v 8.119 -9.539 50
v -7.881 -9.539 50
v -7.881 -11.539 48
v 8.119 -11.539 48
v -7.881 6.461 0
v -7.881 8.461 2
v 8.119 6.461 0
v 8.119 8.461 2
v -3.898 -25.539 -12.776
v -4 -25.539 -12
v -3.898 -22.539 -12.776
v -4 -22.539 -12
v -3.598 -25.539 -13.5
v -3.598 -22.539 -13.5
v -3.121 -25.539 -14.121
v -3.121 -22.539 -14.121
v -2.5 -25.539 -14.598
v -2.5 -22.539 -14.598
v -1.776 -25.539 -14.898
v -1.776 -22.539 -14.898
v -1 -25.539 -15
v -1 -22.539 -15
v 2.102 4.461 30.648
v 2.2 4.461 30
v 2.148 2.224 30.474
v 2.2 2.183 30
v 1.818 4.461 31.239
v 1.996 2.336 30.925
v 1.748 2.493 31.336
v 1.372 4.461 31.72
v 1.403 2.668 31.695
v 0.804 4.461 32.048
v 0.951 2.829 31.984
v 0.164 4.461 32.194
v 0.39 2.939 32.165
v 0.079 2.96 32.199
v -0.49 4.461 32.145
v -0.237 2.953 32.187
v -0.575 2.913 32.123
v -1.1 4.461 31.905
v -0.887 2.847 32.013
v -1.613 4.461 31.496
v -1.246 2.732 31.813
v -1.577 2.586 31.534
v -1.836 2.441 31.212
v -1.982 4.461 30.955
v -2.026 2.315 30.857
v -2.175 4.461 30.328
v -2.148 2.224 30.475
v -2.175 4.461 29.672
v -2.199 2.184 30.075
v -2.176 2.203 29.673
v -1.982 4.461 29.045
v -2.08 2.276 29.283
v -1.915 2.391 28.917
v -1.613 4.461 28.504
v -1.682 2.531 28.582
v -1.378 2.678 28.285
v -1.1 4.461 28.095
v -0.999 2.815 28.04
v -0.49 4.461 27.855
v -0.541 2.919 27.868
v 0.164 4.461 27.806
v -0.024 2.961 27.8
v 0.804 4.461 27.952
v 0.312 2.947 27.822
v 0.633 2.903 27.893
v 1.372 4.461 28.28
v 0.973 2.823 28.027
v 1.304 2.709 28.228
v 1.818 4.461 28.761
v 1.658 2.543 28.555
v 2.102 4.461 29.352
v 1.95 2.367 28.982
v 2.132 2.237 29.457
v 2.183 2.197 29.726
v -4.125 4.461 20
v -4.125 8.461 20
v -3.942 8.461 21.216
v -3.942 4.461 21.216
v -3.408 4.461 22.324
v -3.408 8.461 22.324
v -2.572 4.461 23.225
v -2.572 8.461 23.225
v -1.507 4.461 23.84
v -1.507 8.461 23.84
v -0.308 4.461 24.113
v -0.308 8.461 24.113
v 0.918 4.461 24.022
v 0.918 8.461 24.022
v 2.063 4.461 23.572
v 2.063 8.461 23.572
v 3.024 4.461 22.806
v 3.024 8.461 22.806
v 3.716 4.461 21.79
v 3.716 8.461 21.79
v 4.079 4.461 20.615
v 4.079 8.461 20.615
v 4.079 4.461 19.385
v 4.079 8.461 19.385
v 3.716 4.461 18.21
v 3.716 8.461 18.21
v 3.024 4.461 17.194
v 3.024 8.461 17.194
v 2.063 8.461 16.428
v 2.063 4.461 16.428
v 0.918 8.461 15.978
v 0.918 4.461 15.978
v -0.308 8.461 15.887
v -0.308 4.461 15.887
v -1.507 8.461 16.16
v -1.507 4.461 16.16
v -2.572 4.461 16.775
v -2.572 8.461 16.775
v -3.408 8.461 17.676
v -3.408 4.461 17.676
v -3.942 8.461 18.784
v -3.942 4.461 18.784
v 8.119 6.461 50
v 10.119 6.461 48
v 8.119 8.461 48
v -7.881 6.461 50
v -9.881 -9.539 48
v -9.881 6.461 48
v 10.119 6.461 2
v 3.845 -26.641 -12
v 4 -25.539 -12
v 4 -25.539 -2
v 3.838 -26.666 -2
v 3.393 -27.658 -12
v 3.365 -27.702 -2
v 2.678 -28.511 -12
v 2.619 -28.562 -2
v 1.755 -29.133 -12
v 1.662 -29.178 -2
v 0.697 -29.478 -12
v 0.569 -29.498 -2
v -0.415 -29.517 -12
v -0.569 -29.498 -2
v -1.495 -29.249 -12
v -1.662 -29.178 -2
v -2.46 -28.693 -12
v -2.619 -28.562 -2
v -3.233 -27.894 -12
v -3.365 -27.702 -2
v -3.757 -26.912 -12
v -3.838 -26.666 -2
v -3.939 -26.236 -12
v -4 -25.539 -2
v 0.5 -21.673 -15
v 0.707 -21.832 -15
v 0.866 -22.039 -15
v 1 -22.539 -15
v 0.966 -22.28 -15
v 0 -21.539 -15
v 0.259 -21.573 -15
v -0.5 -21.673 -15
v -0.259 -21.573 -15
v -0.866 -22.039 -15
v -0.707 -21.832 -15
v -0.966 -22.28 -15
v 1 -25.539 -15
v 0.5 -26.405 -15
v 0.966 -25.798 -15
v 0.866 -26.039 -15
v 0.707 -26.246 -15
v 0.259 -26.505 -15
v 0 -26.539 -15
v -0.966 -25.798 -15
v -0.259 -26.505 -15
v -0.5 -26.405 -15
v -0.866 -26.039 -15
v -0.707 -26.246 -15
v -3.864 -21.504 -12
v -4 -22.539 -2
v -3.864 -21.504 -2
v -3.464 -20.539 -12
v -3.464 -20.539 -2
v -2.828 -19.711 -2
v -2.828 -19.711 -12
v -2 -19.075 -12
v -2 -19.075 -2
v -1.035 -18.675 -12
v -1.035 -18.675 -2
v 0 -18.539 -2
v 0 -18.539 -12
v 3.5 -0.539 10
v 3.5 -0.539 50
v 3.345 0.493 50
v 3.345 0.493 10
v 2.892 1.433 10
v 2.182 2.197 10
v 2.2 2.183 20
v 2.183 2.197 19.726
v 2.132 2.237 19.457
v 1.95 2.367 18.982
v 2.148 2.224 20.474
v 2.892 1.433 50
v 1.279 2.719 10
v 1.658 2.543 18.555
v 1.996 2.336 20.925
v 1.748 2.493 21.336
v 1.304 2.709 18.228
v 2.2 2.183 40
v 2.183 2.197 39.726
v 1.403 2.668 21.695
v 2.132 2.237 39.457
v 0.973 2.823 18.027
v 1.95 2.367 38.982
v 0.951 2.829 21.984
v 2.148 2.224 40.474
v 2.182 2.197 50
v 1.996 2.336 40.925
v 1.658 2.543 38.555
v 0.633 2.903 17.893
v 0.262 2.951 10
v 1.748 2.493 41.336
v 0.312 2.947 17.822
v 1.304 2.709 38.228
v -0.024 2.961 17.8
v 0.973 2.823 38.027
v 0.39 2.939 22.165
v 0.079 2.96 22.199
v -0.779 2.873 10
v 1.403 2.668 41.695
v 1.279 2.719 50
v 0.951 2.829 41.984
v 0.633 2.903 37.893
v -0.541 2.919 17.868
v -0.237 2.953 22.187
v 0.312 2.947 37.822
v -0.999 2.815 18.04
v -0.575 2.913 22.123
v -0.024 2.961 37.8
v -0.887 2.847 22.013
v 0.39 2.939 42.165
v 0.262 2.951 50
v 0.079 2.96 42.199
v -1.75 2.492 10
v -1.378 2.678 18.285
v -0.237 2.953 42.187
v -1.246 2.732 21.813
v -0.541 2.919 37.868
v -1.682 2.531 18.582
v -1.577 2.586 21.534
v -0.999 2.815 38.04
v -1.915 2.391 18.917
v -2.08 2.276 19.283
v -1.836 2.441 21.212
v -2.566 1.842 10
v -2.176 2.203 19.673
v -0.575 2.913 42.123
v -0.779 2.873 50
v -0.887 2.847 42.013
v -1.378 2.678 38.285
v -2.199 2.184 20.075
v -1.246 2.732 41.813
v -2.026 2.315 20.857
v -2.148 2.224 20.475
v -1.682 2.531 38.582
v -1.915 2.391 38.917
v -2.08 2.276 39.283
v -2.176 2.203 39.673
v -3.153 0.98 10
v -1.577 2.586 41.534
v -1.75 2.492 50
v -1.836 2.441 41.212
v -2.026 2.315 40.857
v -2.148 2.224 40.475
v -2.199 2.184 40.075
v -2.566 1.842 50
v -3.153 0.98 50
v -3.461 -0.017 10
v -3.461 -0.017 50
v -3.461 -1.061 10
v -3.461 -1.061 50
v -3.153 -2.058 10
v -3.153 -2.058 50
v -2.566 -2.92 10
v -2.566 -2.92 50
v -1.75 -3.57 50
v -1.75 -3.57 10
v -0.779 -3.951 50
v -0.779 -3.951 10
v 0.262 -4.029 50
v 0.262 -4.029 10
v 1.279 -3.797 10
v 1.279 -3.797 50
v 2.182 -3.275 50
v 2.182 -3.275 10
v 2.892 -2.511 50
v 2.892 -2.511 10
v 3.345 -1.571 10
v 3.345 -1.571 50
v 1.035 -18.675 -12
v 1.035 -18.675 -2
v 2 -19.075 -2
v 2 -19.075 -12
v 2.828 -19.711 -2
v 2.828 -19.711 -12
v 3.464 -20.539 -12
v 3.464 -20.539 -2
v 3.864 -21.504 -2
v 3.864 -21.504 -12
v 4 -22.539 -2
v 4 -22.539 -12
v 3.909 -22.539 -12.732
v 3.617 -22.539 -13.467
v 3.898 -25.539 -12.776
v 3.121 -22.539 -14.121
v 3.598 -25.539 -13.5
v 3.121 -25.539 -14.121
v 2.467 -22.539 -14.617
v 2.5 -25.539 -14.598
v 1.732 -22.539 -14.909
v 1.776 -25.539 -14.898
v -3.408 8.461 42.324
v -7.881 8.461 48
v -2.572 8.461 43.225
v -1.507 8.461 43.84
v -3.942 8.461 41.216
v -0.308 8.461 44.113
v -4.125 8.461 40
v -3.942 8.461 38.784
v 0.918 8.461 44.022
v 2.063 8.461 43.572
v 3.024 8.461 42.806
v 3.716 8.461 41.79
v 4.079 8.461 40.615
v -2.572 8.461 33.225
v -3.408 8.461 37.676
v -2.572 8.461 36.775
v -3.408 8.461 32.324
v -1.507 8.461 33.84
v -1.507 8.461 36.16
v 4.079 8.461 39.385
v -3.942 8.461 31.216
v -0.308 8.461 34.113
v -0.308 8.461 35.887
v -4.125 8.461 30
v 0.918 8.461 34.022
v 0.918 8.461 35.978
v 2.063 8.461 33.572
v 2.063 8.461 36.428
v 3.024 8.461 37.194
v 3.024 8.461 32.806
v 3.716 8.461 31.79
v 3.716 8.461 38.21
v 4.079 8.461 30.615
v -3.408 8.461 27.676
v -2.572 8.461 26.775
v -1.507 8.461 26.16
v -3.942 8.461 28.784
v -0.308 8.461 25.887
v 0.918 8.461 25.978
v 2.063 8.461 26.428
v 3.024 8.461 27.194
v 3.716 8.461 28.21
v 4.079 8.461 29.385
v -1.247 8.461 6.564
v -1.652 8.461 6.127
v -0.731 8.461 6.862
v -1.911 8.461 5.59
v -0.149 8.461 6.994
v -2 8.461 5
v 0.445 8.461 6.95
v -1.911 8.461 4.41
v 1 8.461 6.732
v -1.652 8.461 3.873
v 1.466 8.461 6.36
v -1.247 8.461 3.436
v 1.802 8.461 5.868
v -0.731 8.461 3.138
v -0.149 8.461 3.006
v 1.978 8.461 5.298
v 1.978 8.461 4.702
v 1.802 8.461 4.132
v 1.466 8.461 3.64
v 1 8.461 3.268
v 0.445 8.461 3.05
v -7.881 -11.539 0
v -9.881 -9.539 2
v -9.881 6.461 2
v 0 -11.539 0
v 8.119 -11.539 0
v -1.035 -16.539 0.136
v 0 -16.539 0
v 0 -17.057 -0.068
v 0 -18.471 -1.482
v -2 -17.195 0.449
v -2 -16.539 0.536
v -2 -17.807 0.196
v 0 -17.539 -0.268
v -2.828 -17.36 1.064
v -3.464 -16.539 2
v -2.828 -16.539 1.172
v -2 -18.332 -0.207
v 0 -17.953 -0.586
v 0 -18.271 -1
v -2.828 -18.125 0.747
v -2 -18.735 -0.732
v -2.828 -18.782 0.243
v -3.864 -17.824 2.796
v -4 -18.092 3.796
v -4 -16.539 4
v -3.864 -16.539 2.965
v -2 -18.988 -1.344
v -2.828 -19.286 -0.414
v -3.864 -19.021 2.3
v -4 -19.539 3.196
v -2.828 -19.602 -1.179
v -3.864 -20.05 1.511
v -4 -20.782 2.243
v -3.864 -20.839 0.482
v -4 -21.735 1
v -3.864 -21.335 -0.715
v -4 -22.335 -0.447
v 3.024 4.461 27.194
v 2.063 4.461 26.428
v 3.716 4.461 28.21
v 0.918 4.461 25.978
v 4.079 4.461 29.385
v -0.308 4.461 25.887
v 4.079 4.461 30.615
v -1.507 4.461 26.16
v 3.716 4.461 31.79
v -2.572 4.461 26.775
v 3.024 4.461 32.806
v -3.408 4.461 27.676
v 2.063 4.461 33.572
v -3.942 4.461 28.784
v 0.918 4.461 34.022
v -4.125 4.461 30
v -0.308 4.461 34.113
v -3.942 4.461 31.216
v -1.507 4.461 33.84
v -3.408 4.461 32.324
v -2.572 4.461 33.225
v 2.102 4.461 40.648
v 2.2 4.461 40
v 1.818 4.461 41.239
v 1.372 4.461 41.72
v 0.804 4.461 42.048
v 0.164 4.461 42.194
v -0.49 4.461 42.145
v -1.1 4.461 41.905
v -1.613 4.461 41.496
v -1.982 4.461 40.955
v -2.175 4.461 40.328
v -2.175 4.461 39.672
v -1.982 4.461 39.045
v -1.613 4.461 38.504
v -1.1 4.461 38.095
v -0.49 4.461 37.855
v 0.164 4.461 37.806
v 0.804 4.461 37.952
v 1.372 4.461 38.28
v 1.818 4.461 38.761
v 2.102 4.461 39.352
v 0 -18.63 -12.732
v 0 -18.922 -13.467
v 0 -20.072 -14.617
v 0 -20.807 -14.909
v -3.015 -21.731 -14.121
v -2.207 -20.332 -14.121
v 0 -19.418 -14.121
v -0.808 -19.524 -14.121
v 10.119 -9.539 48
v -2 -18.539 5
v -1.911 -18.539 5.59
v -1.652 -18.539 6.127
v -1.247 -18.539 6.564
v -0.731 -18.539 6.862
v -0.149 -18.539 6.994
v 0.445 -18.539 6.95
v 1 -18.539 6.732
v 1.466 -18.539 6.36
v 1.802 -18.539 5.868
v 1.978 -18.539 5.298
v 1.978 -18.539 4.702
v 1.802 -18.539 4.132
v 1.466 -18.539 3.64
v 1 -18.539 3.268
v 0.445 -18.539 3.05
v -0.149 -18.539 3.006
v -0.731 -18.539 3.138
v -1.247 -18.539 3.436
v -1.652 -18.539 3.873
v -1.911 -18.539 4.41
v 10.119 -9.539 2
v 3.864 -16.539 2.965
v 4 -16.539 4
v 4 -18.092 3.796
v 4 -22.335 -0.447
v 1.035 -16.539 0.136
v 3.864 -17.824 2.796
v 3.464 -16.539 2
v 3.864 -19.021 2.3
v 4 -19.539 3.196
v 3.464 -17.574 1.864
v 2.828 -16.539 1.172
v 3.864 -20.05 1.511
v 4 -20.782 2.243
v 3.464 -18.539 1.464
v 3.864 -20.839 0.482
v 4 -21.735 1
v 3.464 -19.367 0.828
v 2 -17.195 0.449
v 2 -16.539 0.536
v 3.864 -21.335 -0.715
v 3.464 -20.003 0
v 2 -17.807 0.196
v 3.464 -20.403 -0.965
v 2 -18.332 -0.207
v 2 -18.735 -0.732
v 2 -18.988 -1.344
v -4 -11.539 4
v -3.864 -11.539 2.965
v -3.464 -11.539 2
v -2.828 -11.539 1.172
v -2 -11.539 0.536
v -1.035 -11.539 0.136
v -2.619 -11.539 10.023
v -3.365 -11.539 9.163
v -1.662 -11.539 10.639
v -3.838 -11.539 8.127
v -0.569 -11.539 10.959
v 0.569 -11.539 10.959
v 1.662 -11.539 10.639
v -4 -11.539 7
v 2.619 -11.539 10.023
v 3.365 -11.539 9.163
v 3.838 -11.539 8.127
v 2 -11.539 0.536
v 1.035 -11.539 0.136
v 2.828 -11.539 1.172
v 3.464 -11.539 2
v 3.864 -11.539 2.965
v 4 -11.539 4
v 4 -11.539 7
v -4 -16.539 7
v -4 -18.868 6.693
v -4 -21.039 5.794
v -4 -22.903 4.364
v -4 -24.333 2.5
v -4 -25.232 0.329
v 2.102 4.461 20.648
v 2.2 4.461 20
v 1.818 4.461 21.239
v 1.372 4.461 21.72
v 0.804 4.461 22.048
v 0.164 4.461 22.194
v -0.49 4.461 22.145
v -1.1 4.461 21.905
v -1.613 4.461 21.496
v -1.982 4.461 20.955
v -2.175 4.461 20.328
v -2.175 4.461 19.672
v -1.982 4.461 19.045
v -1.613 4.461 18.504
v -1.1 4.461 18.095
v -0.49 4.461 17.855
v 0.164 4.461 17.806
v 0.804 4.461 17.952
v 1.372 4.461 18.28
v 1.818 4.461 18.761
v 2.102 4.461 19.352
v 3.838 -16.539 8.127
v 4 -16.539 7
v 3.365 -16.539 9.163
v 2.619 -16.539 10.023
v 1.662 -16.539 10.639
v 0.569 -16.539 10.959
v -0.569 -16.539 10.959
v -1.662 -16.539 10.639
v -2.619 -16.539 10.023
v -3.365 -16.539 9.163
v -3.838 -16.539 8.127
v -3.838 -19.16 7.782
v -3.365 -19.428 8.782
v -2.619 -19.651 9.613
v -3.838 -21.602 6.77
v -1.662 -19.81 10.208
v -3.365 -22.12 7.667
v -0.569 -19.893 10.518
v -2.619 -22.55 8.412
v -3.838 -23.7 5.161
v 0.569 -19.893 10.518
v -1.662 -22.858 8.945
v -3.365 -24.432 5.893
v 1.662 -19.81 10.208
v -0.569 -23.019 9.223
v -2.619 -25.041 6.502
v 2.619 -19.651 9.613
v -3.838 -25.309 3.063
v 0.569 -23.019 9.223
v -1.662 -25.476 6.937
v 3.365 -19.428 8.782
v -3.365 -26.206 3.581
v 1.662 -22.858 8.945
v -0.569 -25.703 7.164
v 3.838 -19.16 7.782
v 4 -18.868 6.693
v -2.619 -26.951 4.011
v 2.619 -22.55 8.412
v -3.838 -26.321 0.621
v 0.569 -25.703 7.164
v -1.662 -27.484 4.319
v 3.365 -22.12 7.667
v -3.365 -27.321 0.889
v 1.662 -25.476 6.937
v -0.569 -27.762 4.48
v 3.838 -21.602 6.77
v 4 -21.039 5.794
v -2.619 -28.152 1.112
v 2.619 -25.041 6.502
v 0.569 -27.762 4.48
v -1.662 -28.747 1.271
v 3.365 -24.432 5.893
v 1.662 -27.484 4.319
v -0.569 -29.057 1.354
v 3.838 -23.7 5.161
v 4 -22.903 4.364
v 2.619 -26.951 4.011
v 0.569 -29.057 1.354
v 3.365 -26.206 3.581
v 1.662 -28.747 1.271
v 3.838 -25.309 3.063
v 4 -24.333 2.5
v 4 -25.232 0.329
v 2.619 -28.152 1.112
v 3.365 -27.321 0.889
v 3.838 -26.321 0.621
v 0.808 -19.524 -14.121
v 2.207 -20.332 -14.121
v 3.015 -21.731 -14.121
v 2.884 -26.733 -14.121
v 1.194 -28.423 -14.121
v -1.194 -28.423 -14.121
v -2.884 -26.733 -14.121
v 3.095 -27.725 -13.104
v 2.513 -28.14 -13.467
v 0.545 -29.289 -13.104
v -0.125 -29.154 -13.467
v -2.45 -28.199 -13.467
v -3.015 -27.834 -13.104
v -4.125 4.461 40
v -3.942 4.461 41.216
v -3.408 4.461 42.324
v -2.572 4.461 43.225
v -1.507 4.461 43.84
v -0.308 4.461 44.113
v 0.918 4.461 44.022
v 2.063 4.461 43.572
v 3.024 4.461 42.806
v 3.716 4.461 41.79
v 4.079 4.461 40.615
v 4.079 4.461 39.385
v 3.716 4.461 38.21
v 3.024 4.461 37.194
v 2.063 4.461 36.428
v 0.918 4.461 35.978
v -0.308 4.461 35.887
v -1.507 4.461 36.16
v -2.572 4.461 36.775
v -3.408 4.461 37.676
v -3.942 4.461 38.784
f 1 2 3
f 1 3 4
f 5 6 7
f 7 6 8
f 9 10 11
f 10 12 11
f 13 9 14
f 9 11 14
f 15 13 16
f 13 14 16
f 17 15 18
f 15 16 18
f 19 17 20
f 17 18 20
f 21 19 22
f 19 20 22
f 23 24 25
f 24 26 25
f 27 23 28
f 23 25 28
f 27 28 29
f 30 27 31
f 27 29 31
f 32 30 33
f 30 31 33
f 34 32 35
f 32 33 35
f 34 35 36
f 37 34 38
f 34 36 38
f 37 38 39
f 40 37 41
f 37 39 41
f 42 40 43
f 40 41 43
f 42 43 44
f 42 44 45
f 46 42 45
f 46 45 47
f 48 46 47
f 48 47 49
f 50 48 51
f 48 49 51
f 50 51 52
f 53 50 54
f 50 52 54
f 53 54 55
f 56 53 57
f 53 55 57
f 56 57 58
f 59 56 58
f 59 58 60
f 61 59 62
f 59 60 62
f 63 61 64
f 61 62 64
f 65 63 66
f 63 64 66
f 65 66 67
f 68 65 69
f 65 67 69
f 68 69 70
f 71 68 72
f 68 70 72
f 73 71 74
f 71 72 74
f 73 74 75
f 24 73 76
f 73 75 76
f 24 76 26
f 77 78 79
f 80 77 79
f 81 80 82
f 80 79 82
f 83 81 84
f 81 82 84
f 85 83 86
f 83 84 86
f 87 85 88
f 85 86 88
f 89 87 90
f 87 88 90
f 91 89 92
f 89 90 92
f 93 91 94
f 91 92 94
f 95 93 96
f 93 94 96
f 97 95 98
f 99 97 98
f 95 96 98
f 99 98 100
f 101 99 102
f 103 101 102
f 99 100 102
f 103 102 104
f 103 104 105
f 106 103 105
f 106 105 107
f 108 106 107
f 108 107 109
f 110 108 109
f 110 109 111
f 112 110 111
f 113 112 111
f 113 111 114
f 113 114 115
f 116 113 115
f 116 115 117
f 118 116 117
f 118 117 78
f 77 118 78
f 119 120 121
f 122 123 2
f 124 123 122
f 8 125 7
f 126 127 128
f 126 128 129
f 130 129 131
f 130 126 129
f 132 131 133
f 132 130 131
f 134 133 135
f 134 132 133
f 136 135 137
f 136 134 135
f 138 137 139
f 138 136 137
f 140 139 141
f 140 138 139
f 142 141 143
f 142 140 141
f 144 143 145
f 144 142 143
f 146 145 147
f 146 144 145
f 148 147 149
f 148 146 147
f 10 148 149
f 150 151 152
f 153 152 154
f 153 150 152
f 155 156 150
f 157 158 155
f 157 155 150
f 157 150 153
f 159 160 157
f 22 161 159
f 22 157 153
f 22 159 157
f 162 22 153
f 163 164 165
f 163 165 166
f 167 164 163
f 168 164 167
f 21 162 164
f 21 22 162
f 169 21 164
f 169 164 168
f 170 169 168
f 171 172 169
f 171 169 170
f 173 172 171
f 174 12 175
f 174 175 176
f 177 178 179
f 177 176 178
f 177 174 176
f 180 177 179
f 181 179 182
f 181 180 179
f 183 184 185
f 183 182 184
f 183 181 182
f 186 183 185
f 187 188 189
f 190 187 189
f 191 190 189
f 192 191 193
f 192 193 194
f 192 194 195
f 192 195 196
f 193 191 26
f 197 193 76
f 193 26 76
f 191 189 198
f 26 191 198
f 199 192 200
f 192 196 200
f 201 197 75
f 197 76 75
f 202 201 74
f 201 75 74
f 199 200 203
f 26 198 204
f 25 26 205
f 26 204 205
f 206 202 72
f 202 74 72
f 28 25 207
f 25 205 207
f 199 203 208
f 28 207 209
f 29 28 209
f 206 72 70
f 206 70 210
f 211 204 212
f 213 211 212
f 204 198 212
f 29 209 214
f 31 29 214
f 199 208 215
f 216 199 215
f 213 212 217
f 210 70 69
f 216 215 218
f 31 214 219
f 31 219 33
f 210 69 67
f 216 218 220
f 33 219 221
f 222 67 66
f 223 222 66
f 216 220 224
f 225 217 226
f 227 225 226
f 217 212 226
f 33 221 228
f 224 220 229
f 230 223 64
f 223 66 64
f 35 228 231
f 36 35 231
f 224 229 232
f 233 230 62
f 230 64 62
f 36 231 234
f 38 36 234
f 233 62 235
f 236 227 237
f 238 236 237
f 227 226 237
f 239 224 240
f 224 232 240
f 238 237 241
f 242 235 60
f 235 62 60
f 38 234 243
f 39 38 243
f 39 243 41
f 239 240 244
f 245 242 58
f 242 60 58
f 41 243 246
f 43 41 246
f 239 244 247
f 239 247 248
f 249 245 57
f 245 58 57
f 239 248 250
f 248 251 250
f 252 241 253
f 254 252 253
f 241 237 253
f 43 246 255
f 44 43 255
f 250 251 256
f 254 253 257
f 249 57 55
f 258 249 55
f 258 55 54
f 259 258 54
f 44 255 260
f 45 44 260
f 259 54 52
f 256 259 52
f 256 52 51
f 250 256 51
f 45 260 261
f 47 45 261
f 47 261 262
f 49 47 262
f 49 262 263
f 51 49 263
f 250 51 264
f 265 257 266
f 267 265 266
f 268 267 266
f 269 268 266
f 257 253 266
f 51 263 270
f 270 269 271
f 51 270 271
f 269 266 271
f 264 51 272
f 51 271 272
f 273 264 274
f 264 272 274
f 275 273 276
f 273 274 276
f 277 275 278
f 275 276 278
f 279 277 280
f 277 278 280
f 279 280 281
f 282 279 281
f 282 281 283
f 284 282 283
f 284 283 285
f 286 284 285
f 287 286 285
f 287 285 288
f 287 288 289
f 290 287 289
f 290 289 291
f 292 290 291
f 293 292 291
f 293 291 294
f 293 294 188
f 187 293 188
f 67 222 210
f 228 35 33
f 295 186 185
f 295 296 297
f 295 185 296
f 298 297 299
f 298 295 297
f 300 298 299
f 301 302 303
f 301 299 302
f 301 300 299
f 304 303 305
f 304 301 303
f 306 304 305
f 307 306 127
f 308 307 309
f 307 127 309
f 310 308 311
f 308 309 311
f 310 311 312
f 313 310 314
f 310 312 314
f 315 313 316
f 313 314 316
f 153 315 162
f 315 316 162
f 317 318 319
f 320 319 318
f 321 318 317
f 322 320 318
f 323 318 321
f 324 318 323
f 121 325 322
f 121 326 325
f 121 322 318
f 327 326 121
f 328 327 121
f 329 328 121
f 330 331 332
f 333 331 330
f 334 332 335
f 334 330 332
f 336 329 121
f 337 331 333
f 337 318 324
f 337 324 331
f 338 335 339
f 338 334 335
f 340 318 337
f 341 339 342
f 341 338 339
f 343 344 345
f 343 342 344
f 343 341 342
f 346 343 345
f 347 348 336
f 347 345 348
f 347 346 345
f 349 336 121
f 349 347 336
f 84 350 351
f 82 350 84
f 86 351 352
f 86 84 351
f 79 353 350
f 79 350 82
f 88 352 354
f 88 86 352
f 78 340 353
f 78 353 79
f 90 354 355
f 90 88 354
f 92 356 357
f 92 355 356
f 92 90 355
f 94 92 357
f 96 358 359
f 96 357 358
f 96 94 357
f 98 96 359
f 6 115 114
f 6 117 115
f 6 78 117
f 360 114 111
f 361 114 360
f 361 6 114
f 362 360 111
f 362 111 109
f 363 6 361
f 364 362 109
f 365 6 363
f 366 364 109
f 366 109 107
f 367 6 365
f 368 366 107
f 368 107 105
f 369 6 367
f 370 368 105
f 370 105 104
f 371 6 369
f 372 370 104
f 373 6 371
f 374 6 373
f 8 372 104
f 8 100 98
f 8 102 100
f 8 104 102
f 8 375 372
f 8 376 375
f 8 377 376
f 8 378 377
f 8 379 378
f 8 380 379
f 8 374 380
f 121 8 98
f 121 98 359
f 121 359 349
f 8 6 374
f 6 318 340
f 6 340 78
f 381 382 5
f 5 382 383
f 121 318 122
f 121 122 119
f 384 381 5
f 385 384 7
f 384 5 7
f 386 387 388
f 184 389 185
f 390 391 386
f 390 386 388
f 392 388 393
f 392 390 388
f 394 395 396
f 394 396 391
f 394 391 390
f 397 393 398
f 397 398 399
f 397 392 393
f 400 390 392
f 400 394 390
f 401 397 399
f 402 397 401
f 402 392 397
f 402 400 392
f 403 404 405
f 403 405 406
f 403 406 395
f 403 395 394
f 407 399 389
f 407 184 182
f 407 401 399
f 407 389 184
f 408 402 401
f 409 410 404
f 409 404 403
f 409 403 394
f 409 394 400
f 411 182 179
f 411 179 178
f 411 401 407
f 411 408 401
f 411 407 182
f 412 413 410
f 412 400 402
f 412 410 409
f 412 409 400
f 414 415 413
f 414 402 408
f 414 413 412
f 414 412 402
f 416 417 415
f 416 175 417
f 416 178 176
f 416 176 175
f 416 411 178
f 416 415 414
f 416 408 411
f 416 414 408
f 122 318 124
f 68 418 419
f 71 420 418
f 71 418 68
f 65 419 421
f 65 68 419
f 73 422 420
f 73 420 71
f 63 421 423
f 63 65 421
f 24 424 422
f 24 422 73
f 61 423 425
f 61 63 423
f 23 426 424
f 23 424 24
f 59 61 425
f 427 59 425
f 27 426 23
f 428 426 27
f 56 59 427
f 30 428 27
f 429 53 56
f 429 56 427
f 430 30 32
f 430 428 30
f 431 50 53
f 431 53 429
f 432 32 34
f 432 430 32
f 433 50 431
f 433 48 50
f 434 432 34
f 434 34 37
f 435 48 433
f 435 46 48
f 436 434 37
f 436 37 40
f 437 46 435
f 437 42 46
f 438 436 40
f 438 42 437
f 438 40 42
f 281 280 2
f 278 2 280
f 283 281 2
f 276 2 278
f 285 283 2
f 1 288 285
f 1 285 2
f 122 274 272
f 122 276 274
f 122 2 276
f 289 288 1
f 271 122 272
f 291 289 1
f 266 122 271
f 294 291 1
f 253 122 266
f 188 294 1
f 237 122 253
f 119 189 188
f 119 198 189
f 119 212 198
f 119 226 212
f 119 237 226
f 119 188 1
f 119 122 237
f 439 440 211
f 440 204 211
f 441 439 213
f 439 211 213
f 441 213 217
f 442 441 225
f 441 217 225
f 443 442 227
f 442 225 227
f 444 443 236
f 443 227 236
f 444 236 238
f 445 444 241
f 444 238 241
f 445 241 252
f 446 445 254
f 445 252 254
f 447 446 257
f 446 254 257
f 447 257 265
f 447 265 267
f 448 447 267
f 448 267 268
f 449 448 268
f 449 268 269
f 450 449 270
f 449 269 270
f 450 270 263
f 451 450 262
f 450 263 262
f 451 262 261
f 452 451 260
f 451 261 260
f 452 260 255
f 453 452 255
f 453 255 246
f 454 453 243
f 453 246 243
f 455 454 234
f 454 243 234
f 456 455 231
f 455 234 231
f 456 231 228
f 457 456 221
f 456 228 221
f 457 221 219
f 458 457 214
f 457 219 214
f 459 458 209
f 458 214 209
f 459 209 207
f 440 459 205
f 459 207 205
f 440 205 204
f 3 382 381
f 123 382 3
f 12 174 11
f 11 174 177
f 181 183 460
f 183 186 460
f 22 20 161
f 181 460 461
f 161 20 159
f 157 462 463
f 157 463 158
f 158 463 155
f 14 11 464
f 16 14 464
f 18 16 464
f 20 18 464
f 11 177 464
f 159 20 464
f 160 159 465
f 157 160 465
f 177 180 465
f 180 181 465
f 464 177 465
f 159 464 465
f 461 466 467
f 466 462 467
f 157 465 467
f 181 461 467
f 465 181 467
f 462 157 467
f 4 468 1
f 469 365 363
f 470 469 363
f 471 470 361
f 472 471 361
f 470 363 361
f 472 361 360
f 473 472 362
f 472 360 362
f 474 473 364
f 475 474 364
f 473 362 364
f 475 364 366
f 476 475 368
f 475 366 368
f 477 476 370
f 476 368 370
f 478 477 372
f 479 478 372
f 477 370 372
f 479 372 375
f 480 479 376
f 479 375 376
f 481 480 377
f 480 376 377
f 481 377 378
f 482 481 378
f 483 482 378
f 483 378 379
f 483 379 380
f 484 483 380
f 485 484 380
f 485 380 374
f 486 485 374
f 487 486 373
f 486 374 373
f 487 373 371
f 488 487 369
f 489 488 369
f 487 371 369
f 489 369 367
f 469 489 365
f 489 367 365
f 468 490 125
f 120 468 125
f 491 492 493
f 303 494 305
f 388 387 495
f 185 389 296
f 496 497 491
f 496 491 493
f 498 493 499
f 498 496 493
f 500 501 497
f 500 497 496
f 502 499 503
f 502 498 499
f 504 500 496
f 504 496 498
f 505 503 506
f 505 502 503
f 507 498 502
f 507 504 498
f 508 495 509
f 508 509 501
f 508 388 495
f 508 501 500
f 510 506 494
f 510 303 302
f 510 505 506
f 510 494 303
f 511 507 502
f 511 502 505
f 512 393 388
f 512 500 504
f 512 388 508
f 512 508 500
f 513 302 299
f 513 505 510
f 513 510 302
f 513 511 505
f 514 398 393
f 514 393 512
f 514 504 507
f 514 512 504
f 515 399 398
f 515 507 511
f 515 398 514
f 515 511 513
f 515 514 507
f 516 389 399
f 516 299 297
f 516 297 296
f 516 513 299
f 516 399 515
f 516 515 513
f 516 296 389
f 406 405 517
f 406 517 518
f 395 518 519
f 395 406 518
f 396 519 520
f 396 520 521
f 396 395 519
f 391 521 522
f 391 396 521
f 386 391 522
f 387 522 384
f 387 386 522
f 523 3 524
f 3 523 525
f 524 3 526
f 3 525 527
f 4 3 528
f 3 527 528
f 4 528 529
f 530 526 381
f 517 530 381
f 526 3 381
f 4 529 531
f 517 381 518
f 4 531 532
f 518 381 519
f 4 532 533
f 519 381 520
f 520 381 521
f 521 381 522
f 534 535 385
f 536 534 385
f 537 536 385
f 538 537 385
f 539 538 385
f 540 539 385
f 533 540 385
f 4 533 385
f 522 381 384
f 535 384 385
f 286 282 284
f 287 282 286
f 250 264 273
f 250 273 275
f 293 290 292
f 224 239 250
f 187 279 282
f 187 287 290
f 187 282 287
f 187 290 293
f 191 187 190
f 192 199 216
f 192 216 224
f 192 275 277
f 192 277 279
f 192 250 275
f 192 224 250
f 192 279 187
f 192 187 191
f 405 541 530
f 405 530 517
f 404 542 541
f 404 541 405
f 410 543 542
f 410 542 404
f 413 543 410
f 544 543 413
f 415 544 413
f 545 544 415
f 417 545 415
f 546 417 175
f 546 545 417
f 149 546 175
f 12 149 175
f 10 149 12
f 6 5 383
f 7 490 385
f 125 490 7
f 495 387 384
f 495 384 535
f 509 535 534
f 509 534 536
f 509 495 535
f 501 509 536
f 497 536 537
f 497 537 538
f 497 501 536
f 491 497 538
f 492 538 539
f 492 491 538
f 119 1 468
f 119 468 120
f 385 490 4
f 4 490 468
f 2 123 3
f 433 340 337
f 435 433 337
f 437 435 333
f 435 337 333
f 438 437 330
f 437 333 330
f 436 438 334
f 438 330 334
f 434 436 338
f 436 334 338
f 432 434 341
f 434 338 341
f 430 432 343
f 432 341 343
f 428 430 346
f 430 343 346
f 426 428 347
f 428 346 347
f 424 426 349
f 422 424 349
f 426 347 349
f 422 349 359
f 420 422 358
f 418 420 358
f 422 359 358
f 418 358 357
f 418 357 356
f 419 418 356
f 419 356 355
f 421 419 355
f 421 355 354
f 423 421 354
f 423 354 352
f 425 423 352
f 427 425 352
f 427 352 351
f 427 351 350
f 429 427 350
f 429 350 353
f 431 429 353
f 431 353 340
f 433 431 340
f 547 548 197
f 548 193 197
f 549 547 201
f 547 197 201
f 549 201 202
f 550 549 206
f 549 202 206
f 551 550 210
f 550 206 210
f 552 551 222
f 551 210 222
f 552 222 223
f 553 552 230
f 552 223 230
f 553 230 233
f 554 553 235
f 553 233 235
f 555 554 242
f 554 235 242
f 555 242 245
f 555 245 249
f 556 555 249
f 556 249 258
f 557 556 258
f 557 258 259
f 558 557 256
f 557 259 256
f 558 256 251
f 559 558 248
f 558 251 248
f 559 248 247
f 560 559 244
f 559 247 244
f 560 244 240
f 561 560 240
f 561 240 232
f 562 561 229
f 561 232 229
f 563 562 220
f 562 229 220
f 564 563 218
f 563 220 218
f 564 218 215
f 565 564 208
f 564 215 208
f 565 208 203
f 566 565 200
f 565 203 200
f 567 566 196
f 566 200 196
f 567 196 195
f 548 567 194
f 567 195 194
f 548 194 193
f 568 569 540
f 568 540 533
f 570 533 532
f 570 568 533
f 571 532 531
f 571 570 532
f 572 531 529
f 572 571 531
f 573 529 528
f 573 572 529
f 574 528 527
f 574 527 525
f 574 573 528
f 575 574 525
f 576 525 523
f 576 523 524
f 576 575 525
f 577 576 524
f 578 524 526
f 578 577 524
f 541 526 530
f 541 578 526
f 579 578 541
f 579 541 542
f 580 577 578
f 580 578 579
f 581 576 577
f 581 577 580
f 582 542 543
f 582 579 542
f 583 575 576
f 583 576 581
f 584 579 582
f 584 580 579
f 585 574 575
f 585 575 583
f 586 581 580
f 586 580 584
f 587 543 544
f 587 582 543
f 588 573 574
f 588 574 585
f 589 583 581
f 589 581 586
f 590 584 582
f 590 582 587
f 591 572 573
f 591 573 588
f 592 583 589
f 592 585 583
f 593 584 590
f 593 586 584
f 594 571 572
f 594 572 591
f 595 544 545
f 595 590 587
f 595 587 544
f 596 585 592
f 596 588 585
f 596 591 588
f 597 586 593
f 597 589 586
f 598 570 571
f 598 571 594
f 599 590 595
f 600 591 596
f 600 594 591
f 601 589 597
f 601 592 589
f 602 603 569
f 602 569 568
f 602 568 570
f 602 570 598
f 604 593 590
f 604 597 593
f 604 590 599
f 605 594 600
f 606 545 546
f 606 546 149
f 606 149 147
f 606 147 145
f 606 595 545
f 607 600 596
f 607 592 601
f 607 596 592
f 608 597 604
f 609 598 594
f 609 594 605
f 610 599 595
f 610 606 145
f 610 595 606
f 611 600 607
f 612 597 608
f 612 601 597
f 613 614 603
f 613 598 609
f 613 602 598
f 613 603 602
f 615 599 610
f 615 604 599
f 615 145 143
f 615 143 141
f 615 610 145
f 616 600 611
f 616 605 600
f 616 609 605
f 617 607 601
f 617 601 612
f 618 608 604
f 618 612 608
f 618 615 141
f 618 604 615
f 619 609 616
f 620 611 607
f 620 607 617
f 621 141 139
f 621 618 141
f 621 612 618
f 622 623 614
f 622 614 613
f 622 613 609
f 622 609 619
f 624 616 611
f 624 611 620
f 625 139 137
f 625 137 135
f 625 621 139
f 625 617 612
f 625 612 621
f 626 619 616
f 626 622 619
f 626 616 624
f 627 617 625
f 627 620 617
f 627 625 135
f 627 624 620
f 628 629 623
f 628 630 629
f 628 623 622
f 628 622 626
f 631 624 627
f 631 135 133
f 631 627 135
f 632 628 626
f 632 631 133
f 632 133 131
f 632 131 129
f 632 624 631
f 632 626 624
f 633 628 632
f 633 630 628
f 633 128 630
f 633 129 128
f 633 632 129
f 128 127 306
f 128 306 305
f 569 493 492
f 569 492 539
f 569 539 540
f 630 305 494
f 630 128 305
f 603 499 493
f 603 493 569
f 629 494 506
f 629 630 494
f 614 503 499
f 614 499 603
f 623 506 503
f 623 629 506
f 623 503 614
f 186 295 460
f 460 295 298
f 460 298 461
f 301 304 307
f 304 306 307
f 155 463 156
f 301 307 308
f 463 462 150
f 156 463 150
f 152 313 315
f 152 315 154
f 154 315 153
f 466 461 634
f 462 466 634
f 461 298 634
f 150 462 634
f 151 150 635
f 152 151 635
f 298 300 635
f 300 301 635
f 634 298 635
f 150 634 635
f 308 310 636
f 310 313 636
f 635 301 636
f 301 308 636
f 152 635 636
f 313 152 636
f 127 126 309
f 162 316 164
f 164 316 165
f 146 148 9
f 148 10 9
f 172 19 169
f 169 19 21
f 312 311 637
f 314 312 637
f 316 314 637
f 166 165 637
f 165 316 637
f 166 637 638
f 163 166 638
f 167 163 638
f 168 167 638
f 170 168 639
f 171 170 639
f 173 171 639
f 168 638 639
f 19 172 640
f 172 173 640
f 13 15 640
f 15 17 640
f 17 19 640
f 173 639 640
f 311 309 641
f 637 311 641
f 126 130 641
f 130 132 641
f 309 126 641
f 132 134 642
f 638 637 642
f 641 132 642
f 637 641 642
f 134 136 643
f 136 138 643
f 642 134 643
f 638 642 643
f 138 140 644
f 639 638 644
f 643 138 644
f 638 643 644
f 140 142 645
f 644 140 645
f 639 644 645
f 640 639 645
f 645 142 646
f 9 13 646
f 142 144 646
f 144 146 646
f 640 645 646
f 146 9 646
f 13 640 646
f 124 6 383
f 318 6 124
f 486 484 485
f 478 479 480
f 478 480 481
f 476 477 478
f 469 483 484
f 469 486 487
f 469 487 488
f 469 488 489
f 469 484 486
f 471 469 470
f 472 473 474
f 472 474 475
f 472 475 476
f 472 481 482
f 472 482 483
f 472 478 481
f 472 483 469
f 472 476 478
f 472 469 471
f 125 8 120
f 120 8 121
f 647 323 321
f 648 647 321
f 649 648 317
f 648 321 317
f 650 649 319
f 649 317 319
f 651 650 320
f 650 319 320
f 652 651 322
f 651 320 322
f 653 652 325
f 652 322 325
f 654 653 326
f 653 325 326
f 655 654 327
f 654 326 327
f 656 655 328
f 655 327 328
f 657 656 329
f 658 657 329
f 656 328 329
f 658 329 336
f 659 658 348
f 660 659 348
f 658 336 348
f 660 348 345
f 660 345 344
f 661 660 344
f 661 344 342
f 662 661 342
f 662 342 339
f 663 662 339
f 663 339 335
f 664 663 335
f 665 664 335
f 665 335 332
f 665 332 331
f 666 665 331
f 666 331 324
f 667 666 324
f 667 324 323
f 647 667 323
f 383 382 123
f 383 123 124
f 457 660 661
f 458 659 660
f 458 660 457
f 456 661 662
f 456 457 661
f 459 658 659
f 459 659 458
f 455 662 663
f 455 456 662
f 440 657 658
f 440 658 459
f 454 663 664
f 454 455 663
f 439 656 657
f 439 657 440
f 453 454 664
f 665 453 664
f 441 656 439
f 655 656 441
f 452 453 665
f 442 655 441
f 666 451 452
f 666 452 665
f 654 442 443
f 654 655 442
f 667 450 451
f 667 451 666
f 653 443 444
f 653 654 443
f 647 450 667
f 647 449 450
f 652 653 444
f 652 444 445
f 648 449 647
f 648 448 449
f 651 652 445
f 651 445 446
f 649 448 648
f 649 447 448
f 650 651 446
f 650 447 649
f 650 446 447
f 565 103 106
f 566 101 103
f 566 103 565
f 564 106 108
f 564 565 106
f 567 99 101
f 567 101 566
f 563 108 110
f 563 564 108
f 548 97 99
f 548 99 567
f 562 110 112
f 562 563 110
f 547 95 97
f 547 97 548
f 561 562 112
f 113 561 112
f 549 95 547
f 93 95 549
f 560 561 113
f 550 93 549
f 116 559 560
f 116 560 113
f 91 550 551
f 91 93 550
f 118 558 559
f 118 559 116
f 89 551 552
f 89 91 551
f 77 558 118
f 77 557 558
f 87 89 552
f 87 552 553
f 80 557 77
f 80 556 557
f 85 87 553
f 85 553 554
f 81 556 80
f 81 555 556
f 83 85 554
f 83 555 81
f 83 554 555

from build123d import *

# Parameters (mm, degrees)
F0_W            = 20
F0_H            = 20
F1_DEPTH        = 50
F5_R            = 3
F6_SIZE         = 2
F7_R            = 3.5
F8_DEPTH        = 40
F10_D           = 4.4
F10_DEPTH       = 10
F10_CBORE_D     = 8.25
F10_CBORE_DEPTH = 4
F10_TIP         = 1.3218933619
F11_R           = 2
F12_DEPTH       = 27


with BuildPart() as f1:
    # F0 (on Top) → F1 (new body)
    with BuildSketch(Plane.XY):
        with Locations((0.1188712195, -1.538979894)):
            Rectangle(F0_W, F0_H)
    extrude(amount=F1_DEPTH)

    # F4: sweep along a path in F3
    with BuildLine(Plane.YZ) as f4_path:
        Line((-11.538979894, 0), (-16.538979894, 0))
        ThreePointArc((-16.538979894, 0), (-17.9531934564, -0.5857864376), (-18.538979894, -2))
        Line((-18.538979894, -2), (-18.538979894, -15))
    # F2 (on face) → F4 (sweep)
    with BuildSketch(Plane.XZ.offset(11.538979894)):
        with BuildLine():
            Line((-4, 7), (-4, 4))
            ThreePointArc((-4, 4), (-2.8284271247, 1.1715728753), (0, 0))
            ThreePointArc((0, 0), (2.8284271247, 1.1715728753), (4, 4))
            Line((4, 4), (4, 7))
            ThreePointArc((4, 7), (0, 11), (-4, 7))
        make_face()
    sweep(path=f4_path.line)

    # F5
    f5_edges = [f1.edges().sort_by_distance(p)[0] for p in [
        (-4, -24.03898, -15),
        (0, -18.53898, -15),
        (4, -24.03898, -15),
        (0, -29.53898, -15),
    ]]
    fillet(f5_edges, radius=F5_R)

    # F6
    f6_edges = [f1.edges().sort_by_distance(p)[0] for p in [
        (10.118871, -11.53898, 25),
        (10.118871, 8.46102, 25),
        (-9.881129, -11.53898, 25),
        (-9.881129, -1.53898, 0),
        (10.118871, -1.53898, 0),
        (0.118871, 8.46102, 0),
        (-9.881129, 8.46102, 25),
        (10.118871, -1.53898, 50),
        (0.118871, 8.46102, 50),
        (-9.881129, -1.53898, 50),
        (0.118871, -11.53898, 50),
    ]]
    chamfer(f6_edges, length=F6_SIZE)

    # F7 (on face) → F8 (cut)
    with BuildSketch(Plane.XY.offset(50)):
        with Locations((0, -0.538979894)):
            Circle(F7_R)
    extrude(amount=-F8_DEPTH, mode=Mode.SUBTRACT)

    # F10
    with Locations(Plane(origin=(0, 8.461020106, 0), x_dir=(-1, 0, 0), z_dir=(0, 1, 0))):
        with Locations((0, 40), (0, 30), (0, 20)):
            CounterBoreHole(F10_D / 2, F10_CBORE_D / 2, F10_CBORE_DEPTH, depth=F10_DEPTH)
            with Locations((0, 0, -(F10_DEPTH + F10_TIP / 2))):  # 118° drill point
                Cone(0, F10_D / 2, F10_TIP, mode=Mode.SUBTRACT)

    # F11 (on face) → F12 (cut)
    with BuildSketch(Plane(origin=(0, 8.461020106, 0), x_dir=(-1, 0, 0), z_dir=(0, 1, 0))):
        with Locations((0, 5)):
            Circle(F11_R)
    extrude(amount=-F12_DEPTH, mode=Mode.SUBTRACT)


solid = f1.part
